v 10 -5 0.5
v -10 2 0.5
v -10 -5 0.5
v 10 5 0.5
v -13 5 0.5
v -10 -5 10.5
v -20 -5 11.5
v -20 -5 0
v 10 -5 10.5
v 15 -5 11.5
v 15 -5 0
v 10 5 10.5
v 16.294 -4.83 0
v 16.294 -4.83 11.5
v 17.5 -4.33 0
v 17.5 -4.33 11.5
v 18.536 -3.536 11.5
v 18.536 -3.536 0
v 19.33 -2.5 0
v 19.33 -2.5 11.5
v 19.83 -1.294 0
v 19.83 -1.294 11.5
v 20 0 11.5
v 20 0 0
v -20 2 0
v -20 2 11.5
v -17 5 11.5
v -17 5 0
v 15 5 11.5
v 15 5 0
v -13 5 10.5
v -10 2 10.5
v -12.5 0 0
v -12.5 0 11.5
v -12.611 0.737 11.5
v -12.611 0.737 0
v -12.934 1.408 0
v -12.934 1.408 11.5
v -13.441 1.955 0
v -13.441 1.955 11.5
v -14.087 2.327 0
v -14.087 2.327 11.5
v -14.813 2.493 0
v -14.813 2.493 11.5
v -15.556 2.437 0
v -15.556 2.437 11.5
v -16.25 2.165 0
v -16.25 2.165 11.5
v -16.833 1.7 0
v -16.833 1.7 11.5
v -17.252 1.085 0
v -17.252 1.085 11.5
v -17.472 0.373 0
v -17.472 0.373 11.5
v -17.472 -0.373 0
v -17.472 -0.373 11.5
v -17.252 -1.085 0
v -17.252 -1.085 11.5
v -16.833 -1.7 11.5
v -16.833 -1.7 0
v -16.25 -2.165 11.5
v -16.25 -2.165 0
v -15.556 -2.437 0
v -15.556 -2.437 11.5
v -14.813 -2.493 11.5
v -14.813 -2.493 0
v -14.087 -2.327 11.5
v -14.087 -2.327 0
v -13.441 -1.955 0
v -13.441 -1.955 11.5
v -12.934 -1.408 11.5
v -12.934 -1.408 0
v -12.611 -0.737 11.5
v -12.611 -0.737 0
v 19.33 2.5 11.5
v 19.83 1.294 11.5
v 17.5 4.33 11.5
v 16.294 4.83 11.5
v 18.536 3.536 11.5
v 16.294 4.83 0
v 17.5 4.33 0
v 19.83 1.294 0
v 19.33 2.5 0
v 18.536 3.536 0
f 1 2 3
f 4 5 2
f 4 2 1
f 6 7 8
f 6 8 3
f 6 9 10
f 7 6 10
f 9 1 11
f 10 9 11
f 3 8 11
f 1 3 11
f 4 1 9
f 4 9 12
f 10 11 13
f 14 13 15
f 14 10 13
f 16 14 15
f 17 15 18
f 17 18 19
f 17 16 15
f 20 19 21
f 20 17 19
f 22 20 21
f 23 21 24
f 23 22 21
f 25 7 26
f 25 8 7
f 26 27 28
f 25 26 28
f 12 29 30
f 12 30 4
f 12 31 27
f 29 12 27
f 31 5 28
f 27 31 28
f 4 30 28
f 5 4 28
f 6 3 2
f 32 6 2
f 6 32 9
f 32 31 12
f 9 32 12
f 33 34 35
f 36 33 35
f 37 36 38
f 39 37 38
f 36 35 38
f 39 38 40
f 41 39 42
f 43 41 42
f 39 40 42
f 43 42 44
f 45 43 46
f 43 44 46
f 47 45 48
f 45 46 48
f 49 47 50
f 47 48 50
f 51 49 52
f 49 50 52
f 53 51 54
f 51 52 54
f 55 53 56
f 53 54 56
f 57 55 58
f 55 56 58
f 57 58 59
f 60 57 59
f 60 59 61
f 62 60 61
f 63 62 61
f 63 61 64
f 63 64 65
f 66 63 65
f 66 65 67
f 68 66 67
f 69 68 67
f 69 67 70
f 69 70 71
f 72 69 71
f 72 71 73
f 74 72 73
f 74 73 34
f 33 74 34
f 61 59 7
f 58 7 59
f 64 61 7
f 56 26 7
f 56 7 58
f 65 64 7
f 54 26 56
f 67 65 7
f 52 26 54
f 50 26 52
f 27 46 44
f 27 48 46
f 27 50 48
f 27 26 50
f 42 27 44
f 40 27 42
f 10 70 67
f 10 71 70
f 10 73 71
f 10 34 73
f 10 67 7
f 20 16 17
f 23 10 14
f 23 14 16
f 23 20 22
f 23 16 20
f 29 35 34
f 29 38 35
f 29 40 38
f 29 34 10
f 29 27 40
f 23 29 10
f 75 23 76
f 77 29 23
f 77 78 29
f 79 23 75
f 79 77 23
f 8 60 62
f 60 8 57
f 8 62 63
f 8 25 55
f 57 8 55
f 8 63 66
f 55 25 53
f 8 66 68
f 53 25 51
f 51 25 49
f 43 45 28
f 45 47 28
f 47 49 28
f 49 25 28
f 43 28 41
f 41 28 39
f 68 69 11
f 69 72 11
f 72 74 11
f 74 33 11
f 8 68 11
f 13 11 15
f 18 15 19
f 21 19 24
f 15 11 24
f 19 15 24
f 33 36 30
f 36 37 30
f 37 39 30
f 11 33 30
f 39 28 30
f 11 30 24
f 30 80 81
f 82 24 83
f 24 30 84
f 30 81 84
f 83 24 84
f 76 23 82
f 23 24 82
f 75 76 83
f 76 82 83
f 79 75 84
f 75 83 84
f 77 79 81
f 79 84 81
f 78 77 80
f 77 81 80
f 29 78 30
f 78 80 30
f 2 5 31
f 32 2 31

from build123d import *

# Parameters (mm, degrees)
F0_W     = 40
F0_H     = 10
F1_DEPTH = 0.5
F2_W     = 10
F2_H     = 10
F3_DEPTH = 10
F4_W     = 10
F4_H     = 10
F4_W_2   = 30
F5_DEPTH = 1
F6_R     = 4.99999
F7_R     = 2.5
F8_DEPTH = 25
F9_SIZE  = 3


# Not quite as in the source:
# - a fillet or chamfer is up to 0.001 mm smaller than in the source, because OpenCascade refuses the exact size


with BuildPart() as f1:
    # F0 (on Top) → F1 (new body)
    with BuildSketch(Plane.XY):
        Rectangle(F0_W, F0_H)
    extrude(amount=F1_DEPTH)

    # F2 (on face) → F3 (join)
    with BuildSketch(Plane.XY.offset(0.5)):
        with Locations((-15, 0)):
            Rectangle(F2_W, F2_H)
        with Locations((15, 0)):
            Rectangle(F2_W, F2_H)
    extrude(amount=F3_DEPTH)

    # F4 (on face) → F5 (join)
    with BuildSketch(Plane.XY.offset(10.5)):
        with Locations((-15, 0)):
            Rectangle(F4_W, F4_H)
        with Locations((5, 0)):
            Rectangle(F4_W_2, F4_H)
    extrude(amount=F5_DEPTH)

    # F6 (radius 5 in the source; OpenCascade refuses exactly that, so slightly less here)
    f6_edges = [f1.edges().sort_by_distance(p)[0] for p in [
        (20, -5, 5.75),
        (20, 5, 5.75),
    ]]
    fillet(f6_edges, radius=F6_R)

    # F7 (on face) → F8 (cut)
    with BuildSketch(Plane.XY.offset(11.5)):
        with Locations((-15, 0)):
            Circle(F7_R)
    extrude(amount=-F8_DEPTH, mode=Mode.SUBTRACT)

    # F9
    f9_edges = [f1.edges().sort_by_distance(p)[0] for p in [
        (-20, 5, 5.75),
        (-10, 5, 5.5),
    ]]
    chamfer(f9_edges, length=F9_SIZE)


solid = f1.part
